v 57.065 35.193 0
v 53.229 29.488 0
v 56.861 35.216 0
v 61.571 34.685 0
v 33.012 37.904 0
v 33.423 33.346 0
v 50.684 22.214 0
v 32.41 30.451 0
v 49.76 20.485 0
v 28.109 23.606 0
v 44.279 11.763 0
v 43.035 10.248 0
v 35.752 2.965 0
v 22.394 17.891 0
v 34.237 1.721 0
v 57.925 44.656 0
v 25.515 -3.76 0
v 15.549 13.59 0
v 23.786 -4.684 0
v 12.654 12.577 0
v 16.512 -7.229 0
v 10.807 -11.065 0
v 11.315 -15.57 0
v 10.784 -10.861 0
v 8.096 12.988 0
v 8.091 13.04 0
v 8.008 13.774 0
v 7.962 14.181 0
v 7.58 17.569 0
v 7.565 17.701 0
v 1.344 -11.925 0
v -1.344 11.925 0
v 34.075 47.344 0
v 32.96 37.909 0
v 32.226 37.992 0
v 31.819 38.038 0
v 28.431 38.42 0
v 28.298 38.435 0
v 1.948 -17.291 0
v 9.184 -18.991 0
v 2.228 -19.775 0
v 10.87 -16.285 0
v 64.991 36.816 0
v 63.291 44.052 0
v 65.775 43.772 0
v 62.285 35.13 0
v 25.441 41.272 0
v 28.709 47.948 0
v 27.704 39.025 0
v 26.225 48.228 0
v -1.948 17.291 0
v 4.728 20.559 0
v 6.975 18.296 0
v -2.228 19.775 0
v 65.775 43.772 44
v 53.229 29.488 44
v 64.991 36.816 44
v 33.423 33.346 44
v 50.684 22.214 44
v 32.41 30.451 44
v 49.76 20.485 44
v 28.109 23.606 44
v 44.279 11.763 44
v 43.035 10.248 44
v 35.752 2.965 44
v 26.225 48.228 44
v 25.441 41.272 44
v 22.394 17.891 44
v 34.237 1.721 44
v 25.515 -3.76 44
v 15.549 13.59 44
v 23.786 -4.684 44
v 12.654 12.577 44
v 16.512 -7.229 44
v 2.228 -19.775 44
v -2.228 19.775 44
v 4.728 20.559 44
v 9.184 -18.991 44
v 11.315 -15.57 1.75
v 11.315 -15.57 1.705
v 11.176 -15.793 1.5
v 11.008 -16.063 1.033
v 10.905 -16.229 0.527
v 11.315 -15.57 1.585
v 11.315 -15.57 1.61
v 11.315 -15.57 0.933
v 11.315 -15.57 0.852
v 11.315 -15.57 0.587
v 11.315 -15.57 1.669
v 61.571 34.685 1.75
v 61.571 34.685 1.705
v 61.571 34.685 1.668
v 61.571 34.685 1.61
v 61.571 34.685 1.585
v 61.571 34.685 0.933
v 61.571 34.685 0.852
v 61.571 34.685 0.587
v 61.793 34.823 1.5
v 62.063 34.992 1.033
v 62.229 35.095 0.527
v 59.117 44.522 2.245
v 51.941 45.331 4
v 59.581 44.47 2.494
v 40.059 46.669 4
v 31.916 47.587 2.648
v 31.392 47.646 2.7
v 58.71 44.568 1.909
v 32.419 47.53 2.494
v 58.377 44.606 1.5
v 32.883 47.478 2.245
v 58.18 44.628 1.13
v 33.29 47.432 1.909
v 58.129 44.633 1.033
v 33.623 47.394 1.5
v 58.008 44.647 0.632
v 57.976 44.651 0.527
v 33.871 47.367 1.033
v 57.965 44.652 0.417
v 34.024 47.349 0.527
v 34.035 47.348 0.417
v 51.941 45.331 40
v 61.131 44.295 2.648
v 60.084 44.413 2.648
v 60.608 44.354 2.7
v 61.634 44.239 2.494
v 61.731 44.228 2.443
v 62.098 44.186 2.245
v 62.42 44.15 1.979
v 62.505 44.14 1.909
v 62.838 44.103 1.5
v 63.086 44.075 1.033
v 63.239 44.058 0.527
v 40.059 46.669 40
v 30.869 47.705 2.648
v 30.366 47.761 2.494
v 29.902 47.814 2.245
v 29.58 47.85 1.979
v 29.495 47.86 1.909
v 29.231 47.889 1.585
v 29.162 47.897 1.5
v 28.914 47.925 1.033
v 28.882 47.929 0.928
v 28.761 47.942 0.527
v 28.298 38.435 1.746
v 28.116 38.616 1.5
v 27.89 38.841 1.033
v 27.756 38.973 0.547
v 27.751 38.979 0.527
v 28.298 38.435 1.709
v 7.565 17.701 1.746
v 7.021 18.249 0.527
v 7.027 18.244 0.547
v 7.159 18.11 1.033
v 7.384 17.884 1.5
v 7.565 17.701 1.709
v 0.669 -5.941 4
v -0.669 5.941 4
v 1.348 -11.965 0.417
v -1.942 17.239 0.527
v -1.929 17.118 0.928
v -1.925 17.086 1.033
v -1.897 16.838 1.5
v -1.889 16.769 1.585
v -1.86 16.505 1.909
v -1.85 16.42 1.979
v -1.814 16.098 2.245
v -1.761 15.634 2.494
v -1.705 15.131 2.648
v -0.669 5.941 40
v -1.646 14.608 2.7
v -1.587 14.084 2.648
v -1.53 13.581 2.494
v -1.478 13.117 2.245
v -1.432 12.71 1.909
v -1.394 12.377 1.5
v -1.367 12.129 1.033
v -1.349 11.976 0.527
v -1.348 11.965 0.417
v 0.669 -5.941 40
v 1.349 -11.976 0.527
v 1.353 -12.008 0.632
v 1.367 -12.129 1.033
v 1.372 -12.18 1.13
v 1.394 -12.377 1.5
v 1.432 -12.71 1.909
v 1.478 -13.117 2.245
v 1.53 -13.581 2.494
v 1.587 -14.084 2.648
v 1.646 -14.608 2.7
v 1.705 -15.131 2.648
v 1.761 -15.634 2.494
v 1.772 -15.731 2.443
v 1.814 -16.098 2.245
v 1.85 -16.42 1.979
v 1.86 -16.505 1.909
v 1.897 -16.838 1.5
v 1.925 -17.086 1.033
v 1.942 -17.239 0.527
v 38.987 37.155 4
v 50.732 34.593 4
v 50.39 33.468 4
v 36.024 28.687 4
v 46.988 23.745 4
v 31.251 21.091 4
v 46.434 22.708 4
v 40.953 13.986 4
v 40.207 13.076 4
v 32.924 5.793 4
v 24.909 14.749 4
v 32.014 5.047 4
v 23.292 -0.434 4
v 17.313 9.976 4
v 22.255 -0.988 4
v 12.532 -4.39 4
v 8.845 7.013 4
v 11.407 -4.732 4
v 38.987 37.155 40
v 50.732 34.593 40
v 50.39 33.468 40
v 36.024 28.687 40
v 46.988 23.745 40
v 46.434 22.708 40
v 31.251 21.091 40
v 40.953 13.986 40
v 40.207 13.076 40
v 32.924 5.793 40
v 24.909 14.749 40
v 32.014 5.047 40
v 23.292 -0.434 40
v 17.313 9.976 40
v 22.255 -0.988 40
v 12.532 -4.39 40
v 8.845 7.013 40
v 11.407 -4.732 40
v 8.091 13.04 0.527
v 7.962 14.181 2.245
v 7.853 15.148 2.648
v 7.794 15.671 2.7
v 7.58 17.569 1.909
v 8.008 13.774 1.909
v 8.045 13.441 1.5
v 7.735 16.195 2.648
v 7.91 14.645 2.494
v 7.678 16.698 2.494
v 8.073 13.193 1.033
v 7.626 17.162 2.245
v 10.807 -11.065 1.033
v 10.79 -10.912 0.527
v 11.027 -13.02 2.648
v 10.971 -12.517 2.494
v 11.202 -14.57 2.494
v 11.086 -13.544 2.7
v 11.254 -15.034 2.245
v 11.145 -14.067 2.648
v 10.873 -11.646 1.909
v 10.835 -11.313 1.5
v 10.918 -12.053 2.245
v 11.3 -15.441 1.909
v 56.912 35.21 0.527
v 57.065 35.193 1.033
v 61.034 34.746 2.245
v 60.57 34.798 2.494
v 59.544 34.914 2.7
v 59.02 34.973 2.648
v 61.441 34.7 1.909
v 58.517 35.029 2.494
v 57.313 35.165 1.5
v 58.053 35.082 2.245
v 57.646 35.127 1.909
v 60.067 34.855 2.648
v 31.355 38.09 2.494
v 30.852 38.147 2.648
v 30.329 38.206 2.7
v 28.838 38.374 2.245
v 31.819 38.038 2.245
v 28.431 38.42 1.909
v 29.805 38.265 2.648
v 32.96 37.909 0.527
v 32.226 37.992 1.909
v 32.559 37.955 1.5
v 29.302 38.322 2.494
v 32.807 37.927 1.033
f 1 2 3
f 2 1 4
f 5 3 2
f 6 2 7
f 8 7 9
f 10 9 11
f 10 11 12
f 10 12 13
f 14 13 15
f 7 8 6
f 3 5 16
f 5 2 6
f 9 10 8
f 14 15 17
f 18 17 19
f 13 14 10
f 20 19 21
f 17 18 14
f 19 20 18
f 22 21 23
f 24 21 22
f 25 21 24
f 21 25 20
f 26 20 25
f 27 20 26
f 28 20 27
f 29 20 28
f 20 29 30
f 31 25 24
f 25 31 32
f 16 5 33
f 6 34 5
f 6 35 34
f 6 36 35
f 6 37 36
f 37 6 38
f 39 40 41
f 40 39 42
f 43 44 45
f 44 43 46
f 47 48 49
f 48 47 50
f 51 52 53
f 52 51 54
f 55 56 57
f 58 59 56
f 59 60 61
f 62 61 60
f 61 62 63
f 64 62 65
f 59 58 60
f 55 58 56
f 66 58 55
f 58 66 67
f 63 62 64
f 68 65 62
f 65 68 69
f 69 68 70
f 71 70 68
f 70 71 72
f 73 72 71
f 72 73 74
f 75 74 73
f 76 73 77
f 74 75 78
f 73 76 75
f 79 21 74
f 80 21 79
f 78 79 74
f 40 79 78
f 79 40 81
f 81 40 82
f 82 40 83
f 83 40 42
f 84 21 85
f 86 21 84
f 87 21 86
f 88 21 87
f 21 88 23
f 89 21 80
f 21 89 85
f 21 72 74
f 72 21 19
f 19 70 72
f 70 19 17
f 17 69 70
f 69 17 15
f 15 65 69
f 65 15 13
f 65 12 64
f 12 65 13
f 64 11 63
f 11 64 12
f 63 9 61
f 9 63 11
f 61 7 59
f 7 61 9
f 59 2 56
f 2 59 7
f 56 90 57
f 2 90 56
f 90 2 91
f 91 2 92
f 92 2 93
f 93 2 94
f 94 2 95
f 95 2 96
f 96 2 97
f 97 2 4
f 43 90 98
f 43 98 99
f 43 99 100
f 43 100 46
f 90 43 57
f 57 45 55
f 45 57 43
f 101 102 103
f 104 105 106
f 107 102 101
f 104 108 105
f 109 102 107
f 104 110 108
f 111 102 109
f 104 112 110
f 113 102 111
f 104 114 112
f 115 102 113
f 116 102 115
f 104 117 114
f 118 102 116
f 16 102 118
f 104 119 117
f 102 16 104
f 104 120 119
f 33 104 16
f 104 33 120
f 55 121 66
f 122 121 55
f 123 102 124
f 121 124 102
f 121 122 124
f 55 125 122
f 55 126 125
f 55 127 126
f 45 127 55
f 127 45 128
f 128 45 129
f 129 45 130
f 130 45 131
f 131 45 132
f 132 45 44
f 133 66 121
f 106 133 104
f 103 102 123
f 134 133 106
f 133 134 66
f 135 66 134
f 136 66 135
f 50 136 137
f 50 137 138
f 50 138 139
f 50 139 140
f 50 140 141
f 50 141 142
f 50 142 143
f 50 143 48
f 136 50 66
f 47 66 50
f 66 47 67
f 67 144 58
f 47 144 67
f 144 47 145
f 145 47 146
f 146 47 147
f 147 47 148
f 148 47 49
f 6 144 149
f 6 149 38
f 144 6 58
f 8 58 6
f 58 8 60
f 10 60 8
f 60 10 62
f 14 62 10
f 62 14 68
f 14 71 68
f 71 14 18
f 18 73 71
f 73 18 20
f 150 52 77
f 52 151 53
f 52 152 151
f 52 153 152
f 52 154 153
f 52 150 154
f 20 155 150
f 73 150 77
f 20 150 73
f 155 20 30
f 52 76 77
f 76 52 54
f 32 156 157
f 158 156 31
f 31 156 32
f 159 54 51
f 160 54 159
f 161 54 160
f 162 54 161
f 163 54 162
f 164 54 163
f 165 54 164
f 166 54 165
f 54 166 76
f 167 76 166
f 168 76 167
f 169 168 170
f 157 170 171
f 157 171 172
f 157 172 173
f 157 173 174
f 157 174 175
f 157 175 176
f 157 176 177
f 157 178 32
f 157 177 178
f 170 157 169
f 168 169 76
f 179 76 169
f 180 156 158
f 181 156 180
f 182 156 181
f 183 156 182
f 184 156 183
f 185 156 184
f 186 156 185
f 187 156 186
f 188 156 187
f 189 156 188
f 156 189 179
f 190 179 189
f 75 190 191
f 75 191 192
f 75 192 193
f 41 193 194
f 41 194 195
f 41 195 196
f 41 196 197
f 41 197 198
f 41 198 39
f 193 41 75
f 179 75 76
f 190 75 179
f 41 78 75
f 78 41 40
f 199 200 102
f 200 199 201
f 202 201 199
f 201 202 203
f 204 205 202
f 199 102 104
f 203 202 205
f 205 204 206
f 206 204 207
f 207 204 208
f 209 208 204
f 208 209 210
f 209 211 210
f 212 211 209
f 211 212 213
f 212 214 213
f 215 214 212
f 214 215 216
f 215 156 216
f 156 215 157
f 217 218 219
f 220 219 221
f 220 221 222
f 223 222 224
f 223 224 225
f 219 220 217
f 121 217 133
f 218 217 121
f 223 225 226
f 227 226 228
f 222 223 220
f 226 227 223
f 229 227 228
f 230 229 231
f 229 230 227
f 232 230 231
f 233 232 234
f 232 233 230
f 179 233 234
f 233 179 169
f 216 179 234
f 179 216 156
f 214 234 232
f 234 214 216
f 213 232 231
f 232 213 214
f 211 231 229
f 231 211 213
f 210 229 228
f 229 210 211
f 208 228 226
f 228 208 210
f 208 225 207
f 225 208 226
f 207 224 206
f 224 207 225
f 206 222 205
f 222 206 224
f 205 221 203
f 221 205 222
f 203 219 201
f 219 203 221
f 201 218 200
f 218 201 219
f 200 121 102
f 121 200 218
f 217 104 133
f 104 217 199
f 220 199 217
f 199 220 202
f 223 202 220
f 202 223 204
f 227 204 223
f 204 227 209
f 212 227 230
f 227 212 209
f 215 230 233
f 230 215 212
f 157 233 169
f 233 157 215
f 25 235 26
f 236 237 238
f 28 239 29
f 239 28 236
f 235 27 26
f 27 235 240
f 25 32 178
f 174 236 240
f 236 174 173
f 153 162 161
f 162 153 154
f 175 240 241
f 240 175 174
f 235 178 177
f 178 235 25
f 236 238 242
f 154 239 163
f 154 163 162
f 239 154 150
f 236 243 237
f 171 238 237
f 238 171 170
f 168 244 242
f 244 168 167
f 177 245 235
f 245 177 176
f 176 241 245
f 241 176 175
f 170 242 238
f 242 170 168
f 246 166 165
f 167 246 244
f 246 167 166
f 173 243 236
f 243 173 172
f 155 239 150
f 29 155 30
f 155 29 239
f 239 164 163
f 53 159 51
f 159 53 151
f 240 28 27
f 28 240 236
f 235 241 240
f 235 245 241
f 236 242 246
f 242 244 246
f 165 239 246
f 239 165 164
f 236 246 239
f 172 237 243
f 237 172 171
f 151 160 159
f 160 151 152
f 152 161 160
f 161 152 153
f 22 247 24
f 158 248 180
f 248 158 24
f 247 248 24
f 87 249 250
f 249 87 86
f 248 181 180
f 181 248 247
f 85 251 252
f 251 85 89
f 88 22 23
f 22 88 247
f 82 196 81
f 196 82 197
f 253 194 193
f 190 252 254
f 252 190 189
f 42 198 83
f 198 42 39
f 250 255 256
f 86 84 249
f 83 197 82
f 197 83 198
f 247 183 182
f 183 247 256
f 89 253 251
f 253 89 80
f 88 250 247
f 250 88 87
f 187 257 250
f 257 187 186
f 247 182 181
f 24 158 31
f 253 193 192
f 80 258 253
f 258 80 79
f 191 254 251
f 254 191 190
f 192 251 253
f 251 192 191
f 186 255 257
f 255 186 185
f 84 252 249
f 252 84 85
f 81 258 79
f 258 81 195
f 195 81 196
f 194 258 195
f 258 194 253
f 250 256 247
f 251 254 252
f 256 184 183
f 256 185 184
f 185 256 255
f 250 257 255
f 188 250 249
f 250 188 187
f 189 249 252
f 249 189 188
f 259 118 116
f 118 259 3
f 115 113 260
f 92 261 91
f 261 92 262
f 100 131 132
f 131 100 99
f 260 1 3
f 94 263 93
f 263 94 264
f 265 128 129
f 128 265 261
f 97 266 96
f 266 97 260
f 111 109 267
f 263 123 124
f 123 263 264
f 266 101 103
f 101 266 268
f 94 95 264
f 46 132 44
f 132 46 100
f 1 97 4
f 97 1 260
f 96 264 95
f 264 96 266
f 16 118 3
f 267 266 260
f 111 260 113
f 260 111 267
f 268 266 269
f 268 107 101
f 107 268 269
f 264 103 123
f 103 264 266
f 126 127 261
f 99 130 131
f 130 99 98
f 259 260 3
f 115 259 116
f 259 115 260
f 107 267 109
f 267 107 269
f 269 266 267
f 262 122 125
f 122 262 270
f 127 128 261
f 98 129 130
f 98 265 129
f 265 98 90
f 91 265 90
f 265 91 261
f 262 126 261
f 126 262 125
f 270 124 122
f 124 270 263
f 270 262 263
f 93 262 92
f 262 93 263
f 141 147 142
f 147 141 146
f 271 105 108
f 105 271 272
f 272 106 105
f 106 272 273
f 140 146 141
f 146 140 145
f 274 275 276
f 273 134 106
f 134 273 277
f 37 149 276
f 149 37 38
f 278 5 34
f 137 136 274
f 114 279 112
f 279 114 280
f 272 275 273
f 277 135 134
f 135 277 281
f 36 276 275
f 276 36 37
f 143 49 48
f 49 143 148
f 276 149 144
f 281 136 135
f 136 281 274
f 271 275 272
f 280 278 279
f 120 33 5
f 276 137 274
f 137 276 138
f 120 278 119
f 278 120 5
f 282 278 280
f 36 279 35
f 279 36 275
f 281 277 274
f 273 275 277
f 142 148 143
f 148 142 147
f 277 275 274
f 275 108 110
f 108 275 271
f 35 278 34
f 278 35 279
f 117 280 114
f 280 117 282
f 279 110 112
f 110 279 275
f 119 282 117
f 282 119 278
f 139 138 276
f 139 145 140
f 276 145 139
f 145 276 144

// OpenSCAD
$fn = 32;

// ----------------------------------------------------------------------
// Air duct: 20 mm duct, 4 mm wall, 44 mm across
// ----------------------------------------------------------------------

// --- parameters (mm) ---
duct_r = 10;              // duct core radius
duct_d = 20;              // duct core diameter
wall = 4;                 // duct wall thickness
height = 44;              // duct width (extrusion height)
port_r = 19.9;            // port flange half width
port_d = 39.8;            // port flange width
port_t = 7;               // port flange thickness
bolt_d = 5.4;             // port bolt holes
bolt_offset = 14.7;       // bolt hole offset from the port axis

difference() {
  /* outer hull chain: tube with a flat flange plate at every port */
  linear_extrude(height = 44) {
    hull() {
      polygon([[2.228, -19.775], [-2.228, 19.775], [4.728, 20.559], [9.184, -18.991]]);
      translate([9.937, 1.12]) circle(r = 10);
    }
    hull() {
      translate([9.937, 1.12]) circle(r = 10);
      translate([10.236, 1.153]) circle(r = 10);
    }
    hull() {
      translate([10.236, 1.153]) circle(r = 10);
      translate([19.959, 4.555]) circle(r = 10);
    }
    hull() {
      translate([19.959, 4.555]) circle(r = 10);
      translate([28.681, 10.036]) circle(r = 10);
    }
    hull() {
      translate([28.681, 10.036]) circle(r = 10);
      translate([35.964, 17.319]) circle(r = 10);
    }
    hull() {
      translate([35.964, 17.319]) circle(r = 10);
      translate([41.445, 26.041]) circle(r = 10);
    }
    hull() {
      translate([41.445, 26.041]) circle(r = 10);
      translate([44.847, 35.764]) circle(r = 10);
    }
    hull() {
      translate([44.847, 35.764]) circle(r = 10);
      translate([44.88, 36.063]) circle(r = 10);
    }
    hull() {
      translate([44.88, 36.063]) circle(r = 10);
      polygon([[26.225, 48.228], [65.775, 43.772], [64.991, 36.816], [25.441, 41.272]]);
    }
  }
  /* air passage: the same chain inset by the wall, 5 mm proud of the ports */
  translate([0, 0, 4]) linear_extrude(height = 36) {
    hull() {
      translate([-4.969, -0.56]) circle(r = 6);
      translate([10.236, 1.153]) circle(r = 6);
    }
    hull() {
      translate([10.236, 1.153]) circle(r = 6);
      translate([19.959, 4.555]) circle(r = 6);
    }
    hull() {
      translate([19.959, 4.555]) circle(r = 6);
      translate([28.681, 10.036]) circle(r = 6);
    }
    hull() {
      translate([28.681, 10.036]) circle(r = 6);
      translate([35.964, 17.319]) circle(r = 6);
    }
    hull() {
      translate([35.964, 17.319]) circle(r = 6);
      translate([41.445, 26.041]) circle(r = 6);
    }
    hull() {
      translate([41.445, 26.041]) circle(r = 6);
      translate([44.847, 35.764]) circle(r = 6);
    }
    hull() {
      translate([44.847, 35.764]) circle(r = 6);
      translate([46.56, 50.969]) circle(r = 6);
    }
  }
  translate([0, 0]) rotate([0, 0, -83.57]) translate([-14.7, -2.5]) rotate([-90, 0, 0]) cylinder(h = 12, d = 5.4);
  translate([0, 0]) rotate([0, 0, -83.57]) translate([14.7, -2.5]) rotate([-90, 0, 0]) cylinder(h = 12, d = 5.4);
  translate([46, 46]) rotate([0, 0, 173.57]) translate([-14.7, -2.5]) rotate([-90, 0, 0]) cylinder(h = 12, d = 5.4);
  translate([46, 46]) rotate([0, 0, 173.57]) translate([14.7, -2.5]) rotate([-90, 0, 0]) cylinder(h = 12, d = 5.4);
}
